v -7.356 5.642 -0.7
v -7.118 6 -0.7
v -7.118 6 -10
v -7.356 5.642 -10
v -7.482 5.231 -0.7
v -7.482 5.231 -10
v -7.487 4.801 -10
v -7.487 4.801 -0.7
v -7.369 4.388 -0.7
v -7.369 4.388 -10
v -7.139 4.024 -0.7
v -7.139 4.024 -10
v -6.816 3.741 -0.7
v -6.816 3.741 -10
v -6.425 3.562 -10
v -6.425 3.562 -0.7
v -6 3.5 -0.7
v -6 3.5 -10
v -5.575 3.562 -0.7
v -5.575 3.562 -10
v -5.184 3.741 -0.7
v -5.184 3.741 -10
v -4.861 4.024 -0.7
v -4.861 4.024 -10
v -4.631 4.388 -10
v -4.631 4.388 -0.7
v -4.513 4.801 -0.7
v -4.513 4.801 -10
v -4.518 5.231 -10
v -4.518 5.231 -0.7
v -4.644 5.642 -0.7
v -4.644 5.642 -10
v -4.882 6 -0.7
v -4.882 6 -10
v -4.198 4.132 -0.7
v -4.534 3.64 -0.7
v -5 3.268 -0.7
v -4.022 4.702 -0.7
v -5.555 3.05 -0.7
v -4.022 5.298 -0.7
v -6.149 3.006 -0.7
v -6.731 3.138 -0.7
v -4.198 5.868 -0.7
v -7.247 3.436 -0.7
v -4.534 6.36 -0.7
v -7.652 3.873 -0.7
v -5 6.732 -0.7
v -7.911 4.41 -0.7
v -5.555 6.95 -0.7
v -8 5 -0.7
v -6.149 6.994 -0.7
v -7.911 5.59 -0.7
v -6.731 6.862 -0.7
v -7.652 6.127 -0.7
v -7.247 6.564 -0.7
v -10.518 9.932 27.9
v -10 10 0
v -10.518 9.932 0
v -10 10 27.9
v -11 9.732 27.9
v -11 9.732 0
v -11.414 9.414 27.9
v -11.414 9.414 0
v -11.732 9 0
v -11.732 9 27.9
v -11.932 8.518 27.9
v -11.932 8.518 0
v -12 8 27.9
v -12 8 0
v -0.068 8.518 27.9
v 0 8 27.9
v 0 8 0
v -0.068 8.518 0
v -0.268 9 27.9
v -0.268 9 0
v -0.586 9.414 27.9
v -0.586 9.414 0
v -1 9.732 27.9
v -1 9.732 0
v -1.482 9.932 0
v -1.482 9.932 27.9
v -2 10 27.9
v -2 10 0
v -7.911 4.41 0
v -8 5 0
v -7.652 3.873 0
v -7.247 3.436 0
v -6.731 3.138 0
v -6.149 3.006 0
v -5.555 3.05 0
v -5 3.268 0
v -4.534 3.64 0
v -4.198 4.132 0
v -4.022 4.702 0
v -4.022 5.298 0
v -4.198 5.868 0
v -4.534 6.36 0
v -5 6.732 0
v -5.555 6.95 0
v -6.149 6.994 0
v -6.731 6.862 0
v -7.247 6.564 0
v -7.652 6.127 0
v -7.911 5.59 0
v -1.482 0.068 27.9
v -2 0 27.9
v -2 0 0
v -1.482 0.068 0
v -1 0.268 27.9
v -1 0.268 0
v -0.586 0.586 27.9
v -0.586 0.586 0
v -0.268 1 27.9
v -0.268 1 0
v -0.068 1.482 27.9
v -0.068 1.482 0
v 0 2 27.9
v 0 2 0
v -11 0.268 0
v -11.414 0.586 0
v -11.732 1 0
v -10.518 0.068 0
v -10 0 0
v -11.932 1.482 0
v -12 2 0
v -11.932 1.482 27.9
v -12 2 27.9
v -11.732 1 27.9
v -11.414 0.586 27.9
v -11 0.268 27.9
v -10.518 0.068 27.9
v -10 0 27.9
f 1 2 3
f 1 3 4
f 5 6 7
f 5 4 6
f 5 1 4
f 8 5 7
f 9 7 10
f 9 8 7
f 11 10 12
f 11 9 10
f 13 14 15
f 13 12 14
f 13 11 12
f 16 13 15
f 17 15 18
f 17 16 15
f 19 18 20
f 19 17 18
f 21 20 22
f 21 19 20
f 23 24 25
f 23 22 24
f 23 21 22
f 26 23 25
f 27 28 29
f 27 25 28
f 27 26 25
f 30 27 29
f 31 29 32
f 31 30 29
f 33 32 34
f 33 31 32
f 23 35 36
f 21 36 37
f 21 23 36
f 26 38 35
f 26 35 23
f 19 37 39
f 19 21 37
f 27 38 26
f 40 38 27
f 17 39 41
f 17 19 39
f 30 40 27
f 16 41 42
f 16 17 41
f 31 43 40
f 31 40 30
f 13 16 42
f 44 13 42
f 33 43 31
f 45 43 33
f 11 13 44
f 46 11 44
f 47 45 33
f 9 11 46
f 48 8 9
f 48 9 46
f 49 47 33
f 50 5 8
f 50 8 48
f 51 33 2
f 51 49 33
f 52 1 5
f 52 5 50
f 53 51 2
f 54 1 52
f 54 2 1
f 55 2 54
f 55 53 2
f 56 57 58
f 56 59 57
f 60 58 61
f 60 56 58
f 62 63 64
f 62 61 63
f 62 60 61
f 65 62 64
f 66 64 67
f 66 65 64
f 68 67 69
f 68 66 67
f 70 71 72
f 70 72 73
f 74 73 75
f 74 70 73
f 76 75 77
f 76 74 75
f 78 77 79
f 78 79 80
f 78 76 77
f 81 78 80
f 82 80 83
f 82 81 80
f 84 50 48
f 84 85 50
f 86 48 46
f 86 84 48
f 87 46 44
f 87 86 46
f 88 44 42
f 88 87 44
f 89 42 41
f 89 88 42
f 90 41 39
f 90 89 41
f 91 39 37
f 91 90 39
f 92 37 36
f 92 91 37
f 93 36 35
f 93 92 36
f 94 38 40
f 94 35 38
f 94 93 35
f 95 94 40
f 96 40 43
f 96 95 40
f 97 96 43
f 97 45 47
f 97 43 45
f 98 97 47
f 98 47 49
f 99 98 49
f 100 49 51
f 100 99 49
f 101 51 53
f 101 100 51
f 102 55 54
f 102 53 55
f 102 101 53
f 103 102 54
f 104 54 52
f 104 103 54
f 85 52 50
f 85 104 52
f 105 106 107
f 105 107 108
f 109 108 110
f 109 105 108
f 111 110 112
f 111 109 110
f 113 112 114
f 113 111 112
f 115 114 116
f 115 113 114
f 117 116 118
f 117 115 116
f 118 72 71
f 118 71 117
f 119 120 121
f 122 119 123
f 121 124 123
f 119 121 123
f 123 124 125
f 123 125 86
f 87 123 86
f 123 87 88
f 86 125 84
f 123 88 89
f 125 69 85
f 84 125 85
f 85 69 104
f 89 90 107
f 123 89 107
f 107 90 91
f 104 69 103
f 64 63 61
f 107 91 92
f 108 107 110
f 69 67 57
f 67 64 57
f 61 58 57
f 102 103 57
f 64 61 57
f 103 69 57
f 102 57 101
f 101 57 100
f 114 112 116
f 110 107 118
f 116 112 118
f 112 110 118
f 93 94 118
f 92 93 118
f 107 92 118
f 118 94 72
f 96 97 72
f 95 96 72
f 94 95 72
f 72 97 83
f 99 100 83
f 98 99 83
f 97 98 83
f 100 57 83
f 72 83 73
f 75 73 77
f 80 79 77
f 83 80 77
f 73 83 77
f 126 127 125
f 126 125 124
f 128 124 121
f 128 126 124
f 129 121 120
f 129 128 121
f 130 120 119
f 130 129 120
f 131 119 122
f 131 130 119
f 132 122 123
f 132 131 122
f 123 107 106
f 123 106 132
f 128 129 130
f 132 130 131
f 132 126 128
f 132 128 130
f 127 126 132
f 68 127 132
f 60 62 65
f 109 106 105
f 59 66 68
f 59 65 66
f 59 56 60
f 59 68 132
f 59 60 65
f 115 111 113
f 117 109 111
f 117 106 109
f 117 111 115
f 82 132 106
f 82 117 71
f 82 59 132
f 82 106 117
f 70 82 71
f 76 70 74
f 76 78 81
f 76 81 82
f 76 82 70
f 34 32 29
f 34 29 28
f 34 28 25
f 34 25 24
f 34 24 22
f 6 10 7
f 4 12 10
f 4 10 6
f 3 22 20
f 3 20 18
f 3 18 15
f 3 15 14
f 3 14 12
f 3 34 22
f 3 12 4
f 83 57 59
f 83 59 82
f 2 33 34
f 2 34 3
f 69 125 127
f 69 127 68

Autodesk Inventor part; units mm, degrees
ref_plane "YZ Plane" through (0, 0, 0) normal (1, 0, 0) x (0, 1, 0)
ref_plane "XZ Plane" through (0, 0, 0) normal (0, 1, 0) x (-1, 0, 0)
ref_plane "XY Plane" through (0, 0, 0) normal (0, 0, 1) x (1, 0, 0)
sketch "Sketch1" plane through (0, 0, 0) normal (0, 0, 1) x (1, 0, 0)
  line L0 (0, 0) -> (-12, 0)
  line L1 (-12, 0) -> (-12, 10)
  line L2 (-12, 10) -> (0, 10)
  line L3 (0, 10) -> (0, 0)
  dimension "d0" = 12
  dimension "d1" = 10
extrude "Extrusion1" add sketch "Sketch1" along normal blind 27.9
sketch "Sketch2" plane through (0, 0, 0) normal (0, 0, -1) x (-1, 0, 0)
  circle A0 centre (6, 5) radius 2
  line L0 (12, 0) -> (0, 0) projected
  line L1 (0, 0) -> (0, 10) projected
  point P0 (6, 0)
  dimension "d4" = 5
  dimension "d5" = 6
  dimension "d9" = 4
extrude "Extrusion2" add sketch "Sketch2" along normal blind 0.7
sketch "Sketch5" plane through (-6, 5, -0.7) normal (0, 0, -1) x (-1, 0, 0)
  circle A0 centre (0, 0) radius 2 projected
  arc A1 (-1.118, 1) -> (1.118, 1) centre (0, 0) ccw
  line L0 (-1.118, 1) -> (1.118, 1)
  point P0 (-6, -5)
  point P1 (0.4397, 1)
  dimension "d14" = 3
  dimension "d15" = 1
extrude "Extrusion4" add sketch "Sketch5" along normal blind 9.3 contours L0 A1
fillet "Fillet1" radius 2 4 edges at (-12, 10, 13.95) (0, 10, 13.95) (-12, 0, 13.95) (0, 0, 13.95)
properties part number "motor"
